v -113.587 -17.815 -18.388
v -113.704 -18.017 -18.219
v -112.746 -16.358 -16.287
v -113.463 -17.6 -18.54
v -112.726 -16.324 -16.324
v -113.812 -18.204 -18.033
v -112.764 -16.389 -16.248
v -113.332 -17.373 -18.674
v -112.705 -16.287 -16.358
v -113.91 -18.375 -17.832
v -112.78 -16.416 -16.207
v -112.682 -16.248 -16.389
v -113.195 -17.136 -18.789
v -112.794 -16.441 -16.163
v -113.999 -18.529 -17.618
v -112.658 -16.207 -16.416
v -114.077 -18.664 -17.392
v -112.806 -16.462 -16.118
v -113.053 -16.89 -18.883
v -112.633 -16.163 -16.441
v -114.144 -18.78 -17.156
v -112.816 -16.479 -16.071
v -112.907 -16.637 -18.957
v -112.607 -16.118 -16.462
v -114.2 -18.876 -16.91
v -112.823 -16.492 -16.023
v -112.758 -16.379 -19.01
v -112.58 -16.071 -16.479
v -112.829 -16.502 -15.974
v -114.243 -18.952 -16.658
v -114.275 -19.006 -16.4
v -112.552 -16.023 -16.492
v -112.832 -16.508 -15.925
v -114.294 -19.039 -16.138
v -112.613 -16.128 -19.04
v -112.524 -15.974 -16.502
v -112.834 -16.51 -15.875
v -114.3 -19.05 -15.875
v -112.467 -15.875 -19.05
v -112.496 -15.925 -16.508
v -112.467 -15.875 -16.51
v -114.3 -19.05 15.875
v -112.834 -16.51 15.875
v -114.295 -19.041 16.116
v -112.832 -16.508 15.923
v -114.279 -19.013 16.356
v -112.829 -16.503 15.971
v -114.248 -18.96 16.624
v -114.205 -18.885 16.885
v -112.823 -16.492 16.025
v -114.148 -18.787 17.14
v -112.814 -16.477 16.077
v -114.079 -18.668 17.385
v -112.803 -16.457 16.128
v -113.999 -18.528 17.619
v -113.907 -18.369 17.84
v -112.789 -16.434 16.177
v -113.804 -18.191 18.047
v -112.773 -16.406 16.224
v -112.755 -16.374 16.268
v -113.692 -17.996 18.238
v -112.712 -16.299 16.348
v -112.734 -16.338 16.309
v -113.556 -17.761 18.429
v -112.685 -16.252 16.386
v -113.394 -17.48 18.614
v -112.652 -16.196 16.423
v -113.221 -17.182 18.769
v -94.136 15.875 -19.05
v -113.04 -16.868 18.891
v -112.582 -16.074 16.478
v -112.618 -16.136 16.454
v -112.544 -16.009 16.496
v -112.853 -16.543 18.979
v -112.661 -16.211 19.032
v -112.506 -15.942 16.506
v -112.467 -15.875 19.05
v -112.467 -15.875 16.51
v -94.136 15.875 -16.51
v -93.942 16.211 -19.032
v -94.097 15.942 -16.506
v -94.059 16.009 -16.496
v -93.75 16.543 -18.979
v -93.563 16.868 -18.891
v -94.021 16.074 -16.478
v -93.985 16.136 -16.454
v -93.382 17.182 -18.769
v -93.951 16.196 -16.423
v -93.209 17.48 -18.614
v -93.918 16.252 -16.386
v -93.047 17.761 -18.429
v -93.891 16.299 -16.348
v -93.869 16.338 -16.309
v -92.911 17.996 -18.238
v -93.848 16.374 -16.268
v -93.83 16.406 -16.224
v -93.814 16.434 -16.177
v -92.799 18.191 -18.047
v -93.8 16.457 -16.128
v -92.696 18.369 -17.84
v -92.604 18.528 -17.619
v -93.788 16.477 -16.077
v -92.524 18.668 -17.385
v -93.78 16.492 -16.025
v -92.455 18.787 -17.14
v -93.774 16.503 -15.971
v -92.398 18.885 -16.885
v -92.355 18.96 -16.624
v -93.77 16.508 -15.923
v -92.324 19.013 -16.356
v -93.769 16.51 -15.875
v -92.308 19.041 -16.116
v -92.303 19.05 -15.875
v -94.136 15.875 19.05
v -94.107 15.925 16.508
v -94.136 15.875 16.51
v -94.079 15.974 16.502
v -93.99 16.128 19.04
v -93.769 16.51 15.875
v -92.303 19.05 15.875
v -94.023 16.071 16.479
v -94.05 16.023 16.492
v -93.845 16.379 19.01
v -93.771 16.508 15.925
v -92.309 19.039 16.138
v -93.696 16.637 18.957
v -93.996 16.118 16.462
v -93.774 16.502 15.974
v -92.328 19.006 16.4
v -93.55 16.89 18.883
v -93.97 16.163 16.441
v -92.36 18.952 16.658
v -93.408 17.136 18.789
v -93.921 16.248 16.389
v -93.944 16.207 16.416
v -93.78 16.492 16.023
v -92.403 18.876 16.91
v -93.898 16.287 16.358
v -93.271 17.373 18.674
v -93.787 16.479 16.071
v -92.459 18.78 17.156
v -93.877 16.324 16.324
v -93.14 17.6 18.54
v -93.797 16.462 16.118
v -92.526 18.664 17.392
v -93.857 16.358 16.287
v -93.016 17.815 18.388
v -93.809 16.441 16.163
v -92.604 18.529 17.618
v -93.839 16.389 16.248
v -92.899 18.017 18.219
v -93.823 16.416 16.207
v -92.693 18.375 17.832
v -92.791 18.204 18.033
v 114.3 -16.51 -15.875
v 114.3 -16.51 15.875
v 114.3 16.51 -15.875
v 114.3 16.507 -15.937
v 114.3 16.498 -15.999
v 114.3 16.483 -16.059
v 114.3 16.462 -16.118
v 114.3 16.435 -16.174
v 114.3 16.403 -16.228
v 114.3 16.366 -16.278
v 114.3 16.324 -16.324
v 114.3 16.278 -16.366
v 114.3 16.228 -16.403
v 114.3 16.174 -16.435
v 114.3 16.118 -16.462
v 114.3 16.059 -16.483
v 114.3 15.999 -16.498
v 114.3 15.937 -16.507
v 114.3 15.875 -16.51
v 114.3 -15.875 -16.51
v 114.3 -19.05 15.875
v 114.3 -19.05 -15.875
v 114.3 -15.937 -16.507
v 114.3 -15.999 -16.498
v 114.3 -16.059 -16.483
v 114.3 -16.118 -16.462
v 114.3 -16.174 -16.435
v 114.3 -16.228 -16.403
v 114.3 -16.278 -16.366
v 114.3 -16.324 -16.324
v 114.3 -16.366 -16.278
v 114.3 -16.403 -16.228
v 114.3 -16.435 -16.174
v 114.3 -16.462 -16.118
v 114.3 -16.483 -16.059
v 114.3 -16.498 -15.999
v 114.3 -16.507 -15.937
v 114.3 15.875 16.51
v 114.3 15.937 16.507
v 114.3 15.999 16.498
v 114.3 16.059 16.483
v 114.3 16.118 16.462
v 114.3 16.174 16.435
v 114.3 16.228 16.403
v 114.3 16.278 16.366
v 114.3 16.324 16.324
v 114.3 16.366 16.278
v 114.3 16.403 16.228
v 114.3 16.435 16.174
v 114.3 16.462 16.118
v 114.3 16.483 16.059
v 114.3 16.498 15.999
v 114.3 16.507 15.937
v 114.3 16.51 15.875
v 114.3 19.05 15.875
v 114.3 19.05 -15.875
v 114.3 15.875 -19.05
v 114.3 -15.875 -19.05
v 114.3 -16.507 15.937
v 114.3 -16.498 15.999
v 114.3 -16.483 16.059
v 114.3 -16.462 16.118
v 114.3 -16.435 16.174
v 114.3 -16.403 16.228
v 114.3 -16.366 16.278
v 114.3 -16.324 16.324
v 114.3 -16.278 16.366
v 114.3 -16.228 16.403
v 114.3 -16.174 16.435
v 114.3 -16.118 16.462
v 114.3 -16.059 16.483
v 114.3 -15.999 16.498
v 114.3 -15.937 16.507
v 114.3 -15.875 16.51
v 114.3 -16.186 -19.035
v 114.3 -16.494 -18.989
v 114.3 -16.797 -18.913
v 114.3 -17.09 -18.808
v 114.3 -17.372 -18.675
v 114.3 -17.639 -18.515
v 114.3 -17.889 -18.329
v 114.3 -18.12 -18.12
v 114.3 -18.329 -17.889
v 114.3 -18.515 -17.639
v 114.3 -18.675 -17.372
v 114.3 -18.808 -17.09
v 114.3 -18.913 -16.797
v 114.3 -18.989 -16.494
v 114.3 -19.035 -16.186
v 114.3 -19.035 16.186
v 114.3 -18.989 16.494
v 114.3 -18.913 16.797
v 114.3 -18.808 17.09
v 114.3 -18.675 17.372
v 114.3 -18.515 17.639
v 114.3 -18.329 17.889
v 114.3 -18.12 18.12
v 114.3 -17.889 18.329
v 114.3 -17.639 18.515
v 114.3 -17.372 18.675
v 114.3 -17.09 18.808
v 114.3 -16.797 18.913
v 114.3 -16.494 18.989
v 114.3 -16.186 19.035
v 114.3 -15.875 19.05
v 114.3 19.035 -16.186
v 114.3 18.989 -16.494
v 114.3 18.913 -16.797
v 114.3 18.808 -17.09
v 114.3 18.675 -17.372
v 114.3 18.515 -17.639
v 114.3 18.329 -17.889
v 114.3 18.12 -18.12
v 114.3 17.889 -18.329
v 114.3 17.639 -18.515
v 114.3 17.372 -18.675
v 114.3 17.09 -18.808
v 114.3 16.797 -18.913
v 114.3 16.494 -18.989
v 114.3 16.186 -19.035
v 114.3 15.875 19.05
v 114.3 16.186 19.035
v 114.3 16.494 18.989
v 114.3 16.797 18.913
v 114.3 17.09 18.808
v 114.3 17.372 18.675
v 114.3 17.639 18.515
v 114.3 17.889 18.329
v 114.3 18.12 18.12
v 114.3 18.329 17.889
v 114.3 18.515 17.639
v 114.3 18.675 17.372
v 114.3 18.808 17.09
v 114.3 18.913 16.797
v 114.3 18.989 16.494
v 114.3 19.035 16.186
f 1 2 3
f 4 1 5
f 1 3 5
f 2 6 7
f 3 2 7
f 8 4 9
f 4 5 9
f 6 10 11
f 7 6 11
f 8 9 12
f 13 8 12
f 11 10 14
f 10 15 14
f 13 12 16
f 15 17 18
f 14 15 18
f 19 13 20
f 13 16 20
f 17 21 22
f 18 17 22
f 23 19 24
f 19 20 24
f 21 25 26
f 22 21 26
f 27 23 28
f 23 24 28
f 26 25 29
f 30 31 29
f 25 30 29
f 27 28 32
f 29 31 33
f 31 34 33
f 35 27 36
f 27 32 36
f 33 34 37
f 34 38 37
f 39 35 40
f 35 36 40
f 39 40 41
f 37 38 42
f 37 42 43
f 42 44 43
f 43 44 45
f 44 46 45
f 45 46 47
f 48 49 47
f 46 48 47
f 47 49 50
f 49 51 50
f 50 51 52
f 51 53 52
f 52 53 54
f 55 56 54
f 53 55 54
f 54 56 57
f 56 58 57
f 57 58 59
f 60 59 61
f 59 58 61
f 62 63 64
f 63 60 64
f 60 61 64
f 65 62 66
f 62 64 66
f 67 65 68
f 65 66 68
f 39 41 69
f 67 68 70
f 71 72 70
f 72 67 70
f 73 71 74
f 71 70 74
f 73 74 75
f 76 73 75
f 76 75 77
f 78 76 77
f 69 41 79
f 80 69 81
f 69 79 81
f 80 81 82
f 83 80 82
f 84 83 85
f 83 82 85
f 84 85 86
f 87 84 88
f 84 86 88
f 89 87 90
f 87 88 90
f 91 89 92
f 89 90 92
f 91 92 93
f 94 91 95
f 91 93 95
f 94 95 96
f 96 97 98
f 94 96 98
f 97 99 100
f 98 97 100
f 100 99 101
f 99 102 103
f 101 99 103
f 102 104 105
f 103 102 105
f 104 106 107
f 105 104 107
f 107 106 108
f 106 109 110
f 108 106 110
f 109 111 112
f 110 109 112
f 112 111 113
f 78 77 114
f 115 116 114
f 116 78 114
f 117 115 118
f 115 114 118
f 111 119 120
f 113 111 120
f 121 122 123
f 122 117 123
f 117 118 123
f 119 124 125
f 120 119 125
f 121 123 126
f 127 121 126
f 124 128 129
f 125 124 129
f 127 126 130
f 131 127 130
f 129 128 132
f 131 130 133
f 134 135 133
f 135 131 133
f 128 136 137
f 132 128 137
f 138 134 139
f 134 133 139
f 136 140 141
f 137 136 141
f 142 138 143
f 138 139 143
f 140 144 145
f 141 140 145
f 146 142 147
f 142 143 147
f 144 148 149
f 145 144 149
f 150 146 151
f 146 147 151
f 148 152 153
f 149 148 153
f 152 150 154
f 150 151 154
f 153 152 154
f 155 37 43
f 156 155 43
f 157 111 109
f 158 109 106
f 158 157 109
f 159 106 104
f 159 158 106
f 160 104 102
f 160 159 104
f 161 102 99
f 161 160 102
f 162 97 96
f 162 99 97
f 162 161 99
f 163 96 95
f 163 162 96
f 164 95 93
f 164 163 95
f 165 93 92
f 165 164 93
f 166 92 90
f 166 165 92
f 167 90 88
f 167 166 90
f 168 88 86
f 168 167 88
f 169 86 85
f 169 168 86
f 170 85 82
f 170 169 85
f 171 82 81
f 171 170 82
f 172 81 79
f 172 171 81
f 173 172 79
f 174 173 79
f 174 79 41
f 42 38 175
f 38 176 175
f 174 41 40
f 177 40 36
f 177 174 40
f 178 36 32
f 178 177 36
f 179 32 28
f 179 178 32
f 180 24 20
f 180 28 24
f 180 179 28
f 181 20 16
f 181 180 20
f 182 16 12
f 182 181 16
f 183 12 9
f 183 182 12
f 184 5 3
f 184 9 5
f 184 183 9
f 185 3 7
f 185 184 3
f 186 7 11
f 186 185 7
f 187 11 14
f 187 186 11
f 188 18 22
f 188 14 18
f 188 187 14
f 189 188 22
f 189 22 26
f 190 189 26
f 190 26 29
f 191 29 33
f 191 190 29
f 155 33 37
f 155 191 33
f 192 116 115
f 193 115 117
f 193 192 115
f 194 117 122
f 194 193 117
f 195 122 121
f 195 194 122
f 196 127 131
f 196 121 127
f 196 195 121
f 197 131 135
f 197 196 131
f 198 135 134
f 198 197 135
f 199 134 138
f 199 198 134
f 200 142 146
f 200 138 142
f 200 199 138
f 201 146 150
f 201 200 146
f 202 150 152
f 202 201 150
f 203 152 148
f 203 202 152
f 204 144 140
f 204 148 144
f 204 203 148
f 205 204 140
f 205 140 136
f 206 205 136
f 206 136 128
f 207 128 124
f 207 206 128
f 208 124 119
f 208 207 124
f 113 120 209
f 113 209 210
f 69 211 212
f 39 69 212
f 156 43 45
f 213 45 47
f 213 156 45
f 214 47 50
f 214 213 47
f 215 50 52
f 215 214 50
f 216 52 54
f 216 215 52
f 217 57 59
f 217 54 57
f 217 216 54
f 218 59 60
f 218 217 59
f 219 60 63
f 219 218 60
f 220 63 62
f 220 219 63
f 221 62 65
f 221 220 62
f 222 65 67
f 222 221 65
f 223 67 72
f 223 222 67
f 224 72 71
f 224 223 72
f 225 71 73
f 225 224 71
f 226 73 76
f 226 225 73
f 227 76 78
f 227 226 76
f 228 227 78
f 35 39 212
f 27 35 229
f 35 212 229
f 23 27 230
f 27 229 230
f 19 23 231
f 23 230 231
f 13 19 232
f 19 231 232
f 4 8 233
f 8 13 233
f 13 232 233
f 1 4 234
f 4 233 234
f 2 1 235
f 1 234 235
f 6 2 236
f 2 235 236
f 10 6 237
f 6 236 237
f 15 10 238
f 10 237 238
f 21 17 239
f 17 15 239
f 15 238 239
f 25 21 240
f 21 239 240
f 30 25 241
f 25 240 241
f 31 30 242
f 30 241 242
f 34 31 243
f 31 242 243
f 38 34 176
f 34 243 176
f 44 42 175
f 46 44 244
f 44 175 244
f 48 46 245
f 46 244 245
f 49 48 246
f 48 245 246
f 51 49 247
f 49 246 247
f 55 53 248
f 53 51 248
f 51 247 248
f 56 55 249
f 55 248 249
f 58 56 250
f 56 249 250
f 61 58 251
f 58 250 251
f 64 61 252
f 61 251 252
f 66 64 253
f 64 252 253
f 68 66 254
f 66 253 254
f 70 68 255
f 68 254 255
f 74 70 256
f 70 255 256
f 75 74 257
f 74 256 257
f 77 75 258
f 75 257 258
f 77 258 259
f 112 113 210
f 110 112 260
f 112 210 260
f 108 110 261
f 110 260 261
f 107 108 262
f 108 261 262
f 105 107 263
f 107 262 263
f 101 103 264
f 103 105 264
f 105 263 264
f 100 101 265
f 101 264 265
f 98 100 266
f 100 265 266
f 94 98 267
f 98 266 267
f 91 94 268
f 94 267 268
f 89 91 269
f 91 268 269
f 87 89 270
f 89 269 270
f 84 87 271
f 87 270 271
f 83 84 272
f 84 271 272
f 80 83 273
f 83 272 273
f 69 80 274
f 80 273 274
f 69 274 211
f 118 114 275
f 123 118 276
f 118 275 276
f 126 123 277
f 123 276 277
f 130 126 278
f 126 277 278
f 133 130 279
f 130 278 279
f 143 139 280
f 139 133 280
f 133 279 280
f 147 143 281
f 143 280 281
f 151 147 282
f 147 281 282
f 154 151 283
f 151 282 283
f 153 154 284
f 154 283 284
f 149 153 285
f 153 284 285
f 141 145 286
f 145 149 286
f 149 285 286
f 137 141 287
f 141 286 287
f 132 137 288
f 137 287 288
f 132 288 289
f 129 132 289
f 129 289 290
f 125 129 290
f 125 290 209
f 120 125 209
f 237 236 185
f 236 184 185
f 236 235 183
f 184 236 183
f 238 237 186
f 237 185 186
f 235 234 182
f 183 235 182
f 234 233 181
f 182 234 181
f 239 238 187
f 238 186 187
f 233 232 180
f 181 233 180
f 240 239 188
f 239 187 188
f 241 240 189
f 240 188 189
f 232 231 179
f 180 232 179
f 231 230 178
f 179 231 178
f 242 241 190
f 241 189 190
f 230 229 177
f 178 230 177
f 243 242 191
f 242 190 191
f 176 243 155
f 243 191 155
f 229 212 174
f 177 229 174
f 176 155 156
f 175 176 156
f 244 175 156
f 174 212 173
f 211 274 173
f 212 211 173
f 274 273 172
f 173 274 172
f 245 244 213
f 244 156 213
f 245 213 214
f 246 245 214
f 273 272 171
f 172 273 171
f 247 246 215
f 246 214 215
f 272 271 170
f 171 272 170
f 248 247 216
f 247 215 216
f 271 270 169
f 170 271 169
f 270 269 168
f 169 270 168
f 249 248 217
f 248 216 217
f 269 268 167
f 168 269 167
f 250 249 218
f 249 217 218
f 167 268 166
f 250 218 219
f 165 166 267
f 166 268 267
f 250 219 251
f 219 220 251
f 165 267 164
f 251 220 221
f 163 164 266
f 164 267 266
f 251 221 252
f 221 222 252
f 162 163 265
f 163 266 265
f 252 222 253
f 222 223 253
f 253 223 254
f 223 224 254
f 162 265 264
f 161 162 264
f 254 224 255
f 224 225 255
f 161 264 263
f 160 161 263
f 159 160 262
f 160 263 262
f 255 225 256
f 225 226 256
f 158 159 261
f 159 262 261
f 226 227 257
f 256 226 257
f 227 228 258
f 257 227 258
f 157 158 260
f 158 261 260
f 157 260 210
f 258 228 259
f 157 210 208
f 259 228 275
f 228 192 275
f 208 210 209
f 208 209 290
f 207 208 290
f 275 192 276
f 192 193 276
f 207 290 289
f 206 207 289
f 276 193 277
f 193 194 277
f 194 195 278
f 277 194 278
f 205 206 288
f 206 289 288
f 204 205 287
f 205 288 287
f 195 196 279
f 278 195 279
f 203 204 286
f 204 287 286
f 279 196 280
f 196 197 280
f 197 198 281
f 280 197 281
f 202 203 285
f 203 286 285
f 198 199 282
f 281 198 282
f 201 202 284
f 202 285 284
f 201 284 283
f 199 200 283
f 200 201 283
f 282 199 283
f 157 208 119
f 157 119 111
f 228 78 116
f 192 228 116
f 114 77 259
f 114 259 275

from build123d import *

# Parameters (mm, degrees)
EXTRUDE_THIN1_DEPTH     = 114.3
CUT_EXTRUDE1_DEPTH      = 1
CUT_EXTRUDE1_DEPTH_BACK = 39.1


with BuildPart() as part:
    # Sketch1 → Extrude-Thin1 (new body, symmetric)
    with BuildSketch(Plane(origin=(0, 0, 0), x_dir=(0, 0, -1), z_dir=(1, 0, 0))):
        with BuildLine():
            Line((-15.875, 19.05), (15.875, 19.05))
            ThreePointArc((15.875, 19.05), (18.12006403, 18.12006403), (19.05, 15.875))
            Line((19.05, 15.875), (19.05, -15.875))
            ThreePointArc((19.05, -15.875), (18.12006403, -18.12006403), (15.875, -19.05))
            Line((15.875, -19.05), (-15.875, -19.05))
            ThreePointArc((-15.875, -19.05), (-18.12006403, -18.12006403), (-19.05, -15.875))
            Line((-19.05, -15.875), (-19.05, 15.875))
            ThreePointArc((-19.05, 15.875), (-18.12006403, 18.12006403), (-15.875, 19.05))
        make_face()
        with BuildLine():
            Line((-15.875, 16.51), (15.875, 16.51))
            ThreePointArc((15.875, 16.51), (16.324012806, 16.324012806), (16.51, 15.875))
            Line((16.51, 15.875), (16.51, -15.875))
            ThreePointArc((16.51, -15.875), (16.324012806, -16.324012806), (15.875, -16.51))
            Line((15.875, -16.51), (-15.875, -16.51))
            ThreePointArc((-15.875, -16.51), (-16.324012806, -16.324012806), (-16.51, -15.875))
            Line((-16.51, -15.875), (-16.51, 15.875))
            ThreePointArc((-16.51, 15.875), (-16.324012806, 16.324012806), (-15.875, 16.51))
        make_face(mode=Mode.SUBTRACT)
    extrude(amount=EXTRUDE_THIN1_DEPTH, both=True)

    # Sketch2 → Cut-Extrude1 (cut, two sides)
    with BuildSketch(Plane.XY.offset(19.05)) as cut_extrude1_sk:
        Polygon((-351.053252404, -429.118662022), (-114.3, -19.05), (-92.302954744, 19.05), (144.45029766, 429.118662022), (-675.687026383, 902.62516683), (-1171.190576447, 44.387842787), align=None)
    extrude(amount=CUT_EXTRUDE1_DEPTH, mode=Mode.SUBTRACT)
    extrude(cut_extrude1_sk.sketch, amount=-CUT_EXTRUDE1_DEPTH_BACK, mode=Mode.SUBTRACT)


solid = part.part
